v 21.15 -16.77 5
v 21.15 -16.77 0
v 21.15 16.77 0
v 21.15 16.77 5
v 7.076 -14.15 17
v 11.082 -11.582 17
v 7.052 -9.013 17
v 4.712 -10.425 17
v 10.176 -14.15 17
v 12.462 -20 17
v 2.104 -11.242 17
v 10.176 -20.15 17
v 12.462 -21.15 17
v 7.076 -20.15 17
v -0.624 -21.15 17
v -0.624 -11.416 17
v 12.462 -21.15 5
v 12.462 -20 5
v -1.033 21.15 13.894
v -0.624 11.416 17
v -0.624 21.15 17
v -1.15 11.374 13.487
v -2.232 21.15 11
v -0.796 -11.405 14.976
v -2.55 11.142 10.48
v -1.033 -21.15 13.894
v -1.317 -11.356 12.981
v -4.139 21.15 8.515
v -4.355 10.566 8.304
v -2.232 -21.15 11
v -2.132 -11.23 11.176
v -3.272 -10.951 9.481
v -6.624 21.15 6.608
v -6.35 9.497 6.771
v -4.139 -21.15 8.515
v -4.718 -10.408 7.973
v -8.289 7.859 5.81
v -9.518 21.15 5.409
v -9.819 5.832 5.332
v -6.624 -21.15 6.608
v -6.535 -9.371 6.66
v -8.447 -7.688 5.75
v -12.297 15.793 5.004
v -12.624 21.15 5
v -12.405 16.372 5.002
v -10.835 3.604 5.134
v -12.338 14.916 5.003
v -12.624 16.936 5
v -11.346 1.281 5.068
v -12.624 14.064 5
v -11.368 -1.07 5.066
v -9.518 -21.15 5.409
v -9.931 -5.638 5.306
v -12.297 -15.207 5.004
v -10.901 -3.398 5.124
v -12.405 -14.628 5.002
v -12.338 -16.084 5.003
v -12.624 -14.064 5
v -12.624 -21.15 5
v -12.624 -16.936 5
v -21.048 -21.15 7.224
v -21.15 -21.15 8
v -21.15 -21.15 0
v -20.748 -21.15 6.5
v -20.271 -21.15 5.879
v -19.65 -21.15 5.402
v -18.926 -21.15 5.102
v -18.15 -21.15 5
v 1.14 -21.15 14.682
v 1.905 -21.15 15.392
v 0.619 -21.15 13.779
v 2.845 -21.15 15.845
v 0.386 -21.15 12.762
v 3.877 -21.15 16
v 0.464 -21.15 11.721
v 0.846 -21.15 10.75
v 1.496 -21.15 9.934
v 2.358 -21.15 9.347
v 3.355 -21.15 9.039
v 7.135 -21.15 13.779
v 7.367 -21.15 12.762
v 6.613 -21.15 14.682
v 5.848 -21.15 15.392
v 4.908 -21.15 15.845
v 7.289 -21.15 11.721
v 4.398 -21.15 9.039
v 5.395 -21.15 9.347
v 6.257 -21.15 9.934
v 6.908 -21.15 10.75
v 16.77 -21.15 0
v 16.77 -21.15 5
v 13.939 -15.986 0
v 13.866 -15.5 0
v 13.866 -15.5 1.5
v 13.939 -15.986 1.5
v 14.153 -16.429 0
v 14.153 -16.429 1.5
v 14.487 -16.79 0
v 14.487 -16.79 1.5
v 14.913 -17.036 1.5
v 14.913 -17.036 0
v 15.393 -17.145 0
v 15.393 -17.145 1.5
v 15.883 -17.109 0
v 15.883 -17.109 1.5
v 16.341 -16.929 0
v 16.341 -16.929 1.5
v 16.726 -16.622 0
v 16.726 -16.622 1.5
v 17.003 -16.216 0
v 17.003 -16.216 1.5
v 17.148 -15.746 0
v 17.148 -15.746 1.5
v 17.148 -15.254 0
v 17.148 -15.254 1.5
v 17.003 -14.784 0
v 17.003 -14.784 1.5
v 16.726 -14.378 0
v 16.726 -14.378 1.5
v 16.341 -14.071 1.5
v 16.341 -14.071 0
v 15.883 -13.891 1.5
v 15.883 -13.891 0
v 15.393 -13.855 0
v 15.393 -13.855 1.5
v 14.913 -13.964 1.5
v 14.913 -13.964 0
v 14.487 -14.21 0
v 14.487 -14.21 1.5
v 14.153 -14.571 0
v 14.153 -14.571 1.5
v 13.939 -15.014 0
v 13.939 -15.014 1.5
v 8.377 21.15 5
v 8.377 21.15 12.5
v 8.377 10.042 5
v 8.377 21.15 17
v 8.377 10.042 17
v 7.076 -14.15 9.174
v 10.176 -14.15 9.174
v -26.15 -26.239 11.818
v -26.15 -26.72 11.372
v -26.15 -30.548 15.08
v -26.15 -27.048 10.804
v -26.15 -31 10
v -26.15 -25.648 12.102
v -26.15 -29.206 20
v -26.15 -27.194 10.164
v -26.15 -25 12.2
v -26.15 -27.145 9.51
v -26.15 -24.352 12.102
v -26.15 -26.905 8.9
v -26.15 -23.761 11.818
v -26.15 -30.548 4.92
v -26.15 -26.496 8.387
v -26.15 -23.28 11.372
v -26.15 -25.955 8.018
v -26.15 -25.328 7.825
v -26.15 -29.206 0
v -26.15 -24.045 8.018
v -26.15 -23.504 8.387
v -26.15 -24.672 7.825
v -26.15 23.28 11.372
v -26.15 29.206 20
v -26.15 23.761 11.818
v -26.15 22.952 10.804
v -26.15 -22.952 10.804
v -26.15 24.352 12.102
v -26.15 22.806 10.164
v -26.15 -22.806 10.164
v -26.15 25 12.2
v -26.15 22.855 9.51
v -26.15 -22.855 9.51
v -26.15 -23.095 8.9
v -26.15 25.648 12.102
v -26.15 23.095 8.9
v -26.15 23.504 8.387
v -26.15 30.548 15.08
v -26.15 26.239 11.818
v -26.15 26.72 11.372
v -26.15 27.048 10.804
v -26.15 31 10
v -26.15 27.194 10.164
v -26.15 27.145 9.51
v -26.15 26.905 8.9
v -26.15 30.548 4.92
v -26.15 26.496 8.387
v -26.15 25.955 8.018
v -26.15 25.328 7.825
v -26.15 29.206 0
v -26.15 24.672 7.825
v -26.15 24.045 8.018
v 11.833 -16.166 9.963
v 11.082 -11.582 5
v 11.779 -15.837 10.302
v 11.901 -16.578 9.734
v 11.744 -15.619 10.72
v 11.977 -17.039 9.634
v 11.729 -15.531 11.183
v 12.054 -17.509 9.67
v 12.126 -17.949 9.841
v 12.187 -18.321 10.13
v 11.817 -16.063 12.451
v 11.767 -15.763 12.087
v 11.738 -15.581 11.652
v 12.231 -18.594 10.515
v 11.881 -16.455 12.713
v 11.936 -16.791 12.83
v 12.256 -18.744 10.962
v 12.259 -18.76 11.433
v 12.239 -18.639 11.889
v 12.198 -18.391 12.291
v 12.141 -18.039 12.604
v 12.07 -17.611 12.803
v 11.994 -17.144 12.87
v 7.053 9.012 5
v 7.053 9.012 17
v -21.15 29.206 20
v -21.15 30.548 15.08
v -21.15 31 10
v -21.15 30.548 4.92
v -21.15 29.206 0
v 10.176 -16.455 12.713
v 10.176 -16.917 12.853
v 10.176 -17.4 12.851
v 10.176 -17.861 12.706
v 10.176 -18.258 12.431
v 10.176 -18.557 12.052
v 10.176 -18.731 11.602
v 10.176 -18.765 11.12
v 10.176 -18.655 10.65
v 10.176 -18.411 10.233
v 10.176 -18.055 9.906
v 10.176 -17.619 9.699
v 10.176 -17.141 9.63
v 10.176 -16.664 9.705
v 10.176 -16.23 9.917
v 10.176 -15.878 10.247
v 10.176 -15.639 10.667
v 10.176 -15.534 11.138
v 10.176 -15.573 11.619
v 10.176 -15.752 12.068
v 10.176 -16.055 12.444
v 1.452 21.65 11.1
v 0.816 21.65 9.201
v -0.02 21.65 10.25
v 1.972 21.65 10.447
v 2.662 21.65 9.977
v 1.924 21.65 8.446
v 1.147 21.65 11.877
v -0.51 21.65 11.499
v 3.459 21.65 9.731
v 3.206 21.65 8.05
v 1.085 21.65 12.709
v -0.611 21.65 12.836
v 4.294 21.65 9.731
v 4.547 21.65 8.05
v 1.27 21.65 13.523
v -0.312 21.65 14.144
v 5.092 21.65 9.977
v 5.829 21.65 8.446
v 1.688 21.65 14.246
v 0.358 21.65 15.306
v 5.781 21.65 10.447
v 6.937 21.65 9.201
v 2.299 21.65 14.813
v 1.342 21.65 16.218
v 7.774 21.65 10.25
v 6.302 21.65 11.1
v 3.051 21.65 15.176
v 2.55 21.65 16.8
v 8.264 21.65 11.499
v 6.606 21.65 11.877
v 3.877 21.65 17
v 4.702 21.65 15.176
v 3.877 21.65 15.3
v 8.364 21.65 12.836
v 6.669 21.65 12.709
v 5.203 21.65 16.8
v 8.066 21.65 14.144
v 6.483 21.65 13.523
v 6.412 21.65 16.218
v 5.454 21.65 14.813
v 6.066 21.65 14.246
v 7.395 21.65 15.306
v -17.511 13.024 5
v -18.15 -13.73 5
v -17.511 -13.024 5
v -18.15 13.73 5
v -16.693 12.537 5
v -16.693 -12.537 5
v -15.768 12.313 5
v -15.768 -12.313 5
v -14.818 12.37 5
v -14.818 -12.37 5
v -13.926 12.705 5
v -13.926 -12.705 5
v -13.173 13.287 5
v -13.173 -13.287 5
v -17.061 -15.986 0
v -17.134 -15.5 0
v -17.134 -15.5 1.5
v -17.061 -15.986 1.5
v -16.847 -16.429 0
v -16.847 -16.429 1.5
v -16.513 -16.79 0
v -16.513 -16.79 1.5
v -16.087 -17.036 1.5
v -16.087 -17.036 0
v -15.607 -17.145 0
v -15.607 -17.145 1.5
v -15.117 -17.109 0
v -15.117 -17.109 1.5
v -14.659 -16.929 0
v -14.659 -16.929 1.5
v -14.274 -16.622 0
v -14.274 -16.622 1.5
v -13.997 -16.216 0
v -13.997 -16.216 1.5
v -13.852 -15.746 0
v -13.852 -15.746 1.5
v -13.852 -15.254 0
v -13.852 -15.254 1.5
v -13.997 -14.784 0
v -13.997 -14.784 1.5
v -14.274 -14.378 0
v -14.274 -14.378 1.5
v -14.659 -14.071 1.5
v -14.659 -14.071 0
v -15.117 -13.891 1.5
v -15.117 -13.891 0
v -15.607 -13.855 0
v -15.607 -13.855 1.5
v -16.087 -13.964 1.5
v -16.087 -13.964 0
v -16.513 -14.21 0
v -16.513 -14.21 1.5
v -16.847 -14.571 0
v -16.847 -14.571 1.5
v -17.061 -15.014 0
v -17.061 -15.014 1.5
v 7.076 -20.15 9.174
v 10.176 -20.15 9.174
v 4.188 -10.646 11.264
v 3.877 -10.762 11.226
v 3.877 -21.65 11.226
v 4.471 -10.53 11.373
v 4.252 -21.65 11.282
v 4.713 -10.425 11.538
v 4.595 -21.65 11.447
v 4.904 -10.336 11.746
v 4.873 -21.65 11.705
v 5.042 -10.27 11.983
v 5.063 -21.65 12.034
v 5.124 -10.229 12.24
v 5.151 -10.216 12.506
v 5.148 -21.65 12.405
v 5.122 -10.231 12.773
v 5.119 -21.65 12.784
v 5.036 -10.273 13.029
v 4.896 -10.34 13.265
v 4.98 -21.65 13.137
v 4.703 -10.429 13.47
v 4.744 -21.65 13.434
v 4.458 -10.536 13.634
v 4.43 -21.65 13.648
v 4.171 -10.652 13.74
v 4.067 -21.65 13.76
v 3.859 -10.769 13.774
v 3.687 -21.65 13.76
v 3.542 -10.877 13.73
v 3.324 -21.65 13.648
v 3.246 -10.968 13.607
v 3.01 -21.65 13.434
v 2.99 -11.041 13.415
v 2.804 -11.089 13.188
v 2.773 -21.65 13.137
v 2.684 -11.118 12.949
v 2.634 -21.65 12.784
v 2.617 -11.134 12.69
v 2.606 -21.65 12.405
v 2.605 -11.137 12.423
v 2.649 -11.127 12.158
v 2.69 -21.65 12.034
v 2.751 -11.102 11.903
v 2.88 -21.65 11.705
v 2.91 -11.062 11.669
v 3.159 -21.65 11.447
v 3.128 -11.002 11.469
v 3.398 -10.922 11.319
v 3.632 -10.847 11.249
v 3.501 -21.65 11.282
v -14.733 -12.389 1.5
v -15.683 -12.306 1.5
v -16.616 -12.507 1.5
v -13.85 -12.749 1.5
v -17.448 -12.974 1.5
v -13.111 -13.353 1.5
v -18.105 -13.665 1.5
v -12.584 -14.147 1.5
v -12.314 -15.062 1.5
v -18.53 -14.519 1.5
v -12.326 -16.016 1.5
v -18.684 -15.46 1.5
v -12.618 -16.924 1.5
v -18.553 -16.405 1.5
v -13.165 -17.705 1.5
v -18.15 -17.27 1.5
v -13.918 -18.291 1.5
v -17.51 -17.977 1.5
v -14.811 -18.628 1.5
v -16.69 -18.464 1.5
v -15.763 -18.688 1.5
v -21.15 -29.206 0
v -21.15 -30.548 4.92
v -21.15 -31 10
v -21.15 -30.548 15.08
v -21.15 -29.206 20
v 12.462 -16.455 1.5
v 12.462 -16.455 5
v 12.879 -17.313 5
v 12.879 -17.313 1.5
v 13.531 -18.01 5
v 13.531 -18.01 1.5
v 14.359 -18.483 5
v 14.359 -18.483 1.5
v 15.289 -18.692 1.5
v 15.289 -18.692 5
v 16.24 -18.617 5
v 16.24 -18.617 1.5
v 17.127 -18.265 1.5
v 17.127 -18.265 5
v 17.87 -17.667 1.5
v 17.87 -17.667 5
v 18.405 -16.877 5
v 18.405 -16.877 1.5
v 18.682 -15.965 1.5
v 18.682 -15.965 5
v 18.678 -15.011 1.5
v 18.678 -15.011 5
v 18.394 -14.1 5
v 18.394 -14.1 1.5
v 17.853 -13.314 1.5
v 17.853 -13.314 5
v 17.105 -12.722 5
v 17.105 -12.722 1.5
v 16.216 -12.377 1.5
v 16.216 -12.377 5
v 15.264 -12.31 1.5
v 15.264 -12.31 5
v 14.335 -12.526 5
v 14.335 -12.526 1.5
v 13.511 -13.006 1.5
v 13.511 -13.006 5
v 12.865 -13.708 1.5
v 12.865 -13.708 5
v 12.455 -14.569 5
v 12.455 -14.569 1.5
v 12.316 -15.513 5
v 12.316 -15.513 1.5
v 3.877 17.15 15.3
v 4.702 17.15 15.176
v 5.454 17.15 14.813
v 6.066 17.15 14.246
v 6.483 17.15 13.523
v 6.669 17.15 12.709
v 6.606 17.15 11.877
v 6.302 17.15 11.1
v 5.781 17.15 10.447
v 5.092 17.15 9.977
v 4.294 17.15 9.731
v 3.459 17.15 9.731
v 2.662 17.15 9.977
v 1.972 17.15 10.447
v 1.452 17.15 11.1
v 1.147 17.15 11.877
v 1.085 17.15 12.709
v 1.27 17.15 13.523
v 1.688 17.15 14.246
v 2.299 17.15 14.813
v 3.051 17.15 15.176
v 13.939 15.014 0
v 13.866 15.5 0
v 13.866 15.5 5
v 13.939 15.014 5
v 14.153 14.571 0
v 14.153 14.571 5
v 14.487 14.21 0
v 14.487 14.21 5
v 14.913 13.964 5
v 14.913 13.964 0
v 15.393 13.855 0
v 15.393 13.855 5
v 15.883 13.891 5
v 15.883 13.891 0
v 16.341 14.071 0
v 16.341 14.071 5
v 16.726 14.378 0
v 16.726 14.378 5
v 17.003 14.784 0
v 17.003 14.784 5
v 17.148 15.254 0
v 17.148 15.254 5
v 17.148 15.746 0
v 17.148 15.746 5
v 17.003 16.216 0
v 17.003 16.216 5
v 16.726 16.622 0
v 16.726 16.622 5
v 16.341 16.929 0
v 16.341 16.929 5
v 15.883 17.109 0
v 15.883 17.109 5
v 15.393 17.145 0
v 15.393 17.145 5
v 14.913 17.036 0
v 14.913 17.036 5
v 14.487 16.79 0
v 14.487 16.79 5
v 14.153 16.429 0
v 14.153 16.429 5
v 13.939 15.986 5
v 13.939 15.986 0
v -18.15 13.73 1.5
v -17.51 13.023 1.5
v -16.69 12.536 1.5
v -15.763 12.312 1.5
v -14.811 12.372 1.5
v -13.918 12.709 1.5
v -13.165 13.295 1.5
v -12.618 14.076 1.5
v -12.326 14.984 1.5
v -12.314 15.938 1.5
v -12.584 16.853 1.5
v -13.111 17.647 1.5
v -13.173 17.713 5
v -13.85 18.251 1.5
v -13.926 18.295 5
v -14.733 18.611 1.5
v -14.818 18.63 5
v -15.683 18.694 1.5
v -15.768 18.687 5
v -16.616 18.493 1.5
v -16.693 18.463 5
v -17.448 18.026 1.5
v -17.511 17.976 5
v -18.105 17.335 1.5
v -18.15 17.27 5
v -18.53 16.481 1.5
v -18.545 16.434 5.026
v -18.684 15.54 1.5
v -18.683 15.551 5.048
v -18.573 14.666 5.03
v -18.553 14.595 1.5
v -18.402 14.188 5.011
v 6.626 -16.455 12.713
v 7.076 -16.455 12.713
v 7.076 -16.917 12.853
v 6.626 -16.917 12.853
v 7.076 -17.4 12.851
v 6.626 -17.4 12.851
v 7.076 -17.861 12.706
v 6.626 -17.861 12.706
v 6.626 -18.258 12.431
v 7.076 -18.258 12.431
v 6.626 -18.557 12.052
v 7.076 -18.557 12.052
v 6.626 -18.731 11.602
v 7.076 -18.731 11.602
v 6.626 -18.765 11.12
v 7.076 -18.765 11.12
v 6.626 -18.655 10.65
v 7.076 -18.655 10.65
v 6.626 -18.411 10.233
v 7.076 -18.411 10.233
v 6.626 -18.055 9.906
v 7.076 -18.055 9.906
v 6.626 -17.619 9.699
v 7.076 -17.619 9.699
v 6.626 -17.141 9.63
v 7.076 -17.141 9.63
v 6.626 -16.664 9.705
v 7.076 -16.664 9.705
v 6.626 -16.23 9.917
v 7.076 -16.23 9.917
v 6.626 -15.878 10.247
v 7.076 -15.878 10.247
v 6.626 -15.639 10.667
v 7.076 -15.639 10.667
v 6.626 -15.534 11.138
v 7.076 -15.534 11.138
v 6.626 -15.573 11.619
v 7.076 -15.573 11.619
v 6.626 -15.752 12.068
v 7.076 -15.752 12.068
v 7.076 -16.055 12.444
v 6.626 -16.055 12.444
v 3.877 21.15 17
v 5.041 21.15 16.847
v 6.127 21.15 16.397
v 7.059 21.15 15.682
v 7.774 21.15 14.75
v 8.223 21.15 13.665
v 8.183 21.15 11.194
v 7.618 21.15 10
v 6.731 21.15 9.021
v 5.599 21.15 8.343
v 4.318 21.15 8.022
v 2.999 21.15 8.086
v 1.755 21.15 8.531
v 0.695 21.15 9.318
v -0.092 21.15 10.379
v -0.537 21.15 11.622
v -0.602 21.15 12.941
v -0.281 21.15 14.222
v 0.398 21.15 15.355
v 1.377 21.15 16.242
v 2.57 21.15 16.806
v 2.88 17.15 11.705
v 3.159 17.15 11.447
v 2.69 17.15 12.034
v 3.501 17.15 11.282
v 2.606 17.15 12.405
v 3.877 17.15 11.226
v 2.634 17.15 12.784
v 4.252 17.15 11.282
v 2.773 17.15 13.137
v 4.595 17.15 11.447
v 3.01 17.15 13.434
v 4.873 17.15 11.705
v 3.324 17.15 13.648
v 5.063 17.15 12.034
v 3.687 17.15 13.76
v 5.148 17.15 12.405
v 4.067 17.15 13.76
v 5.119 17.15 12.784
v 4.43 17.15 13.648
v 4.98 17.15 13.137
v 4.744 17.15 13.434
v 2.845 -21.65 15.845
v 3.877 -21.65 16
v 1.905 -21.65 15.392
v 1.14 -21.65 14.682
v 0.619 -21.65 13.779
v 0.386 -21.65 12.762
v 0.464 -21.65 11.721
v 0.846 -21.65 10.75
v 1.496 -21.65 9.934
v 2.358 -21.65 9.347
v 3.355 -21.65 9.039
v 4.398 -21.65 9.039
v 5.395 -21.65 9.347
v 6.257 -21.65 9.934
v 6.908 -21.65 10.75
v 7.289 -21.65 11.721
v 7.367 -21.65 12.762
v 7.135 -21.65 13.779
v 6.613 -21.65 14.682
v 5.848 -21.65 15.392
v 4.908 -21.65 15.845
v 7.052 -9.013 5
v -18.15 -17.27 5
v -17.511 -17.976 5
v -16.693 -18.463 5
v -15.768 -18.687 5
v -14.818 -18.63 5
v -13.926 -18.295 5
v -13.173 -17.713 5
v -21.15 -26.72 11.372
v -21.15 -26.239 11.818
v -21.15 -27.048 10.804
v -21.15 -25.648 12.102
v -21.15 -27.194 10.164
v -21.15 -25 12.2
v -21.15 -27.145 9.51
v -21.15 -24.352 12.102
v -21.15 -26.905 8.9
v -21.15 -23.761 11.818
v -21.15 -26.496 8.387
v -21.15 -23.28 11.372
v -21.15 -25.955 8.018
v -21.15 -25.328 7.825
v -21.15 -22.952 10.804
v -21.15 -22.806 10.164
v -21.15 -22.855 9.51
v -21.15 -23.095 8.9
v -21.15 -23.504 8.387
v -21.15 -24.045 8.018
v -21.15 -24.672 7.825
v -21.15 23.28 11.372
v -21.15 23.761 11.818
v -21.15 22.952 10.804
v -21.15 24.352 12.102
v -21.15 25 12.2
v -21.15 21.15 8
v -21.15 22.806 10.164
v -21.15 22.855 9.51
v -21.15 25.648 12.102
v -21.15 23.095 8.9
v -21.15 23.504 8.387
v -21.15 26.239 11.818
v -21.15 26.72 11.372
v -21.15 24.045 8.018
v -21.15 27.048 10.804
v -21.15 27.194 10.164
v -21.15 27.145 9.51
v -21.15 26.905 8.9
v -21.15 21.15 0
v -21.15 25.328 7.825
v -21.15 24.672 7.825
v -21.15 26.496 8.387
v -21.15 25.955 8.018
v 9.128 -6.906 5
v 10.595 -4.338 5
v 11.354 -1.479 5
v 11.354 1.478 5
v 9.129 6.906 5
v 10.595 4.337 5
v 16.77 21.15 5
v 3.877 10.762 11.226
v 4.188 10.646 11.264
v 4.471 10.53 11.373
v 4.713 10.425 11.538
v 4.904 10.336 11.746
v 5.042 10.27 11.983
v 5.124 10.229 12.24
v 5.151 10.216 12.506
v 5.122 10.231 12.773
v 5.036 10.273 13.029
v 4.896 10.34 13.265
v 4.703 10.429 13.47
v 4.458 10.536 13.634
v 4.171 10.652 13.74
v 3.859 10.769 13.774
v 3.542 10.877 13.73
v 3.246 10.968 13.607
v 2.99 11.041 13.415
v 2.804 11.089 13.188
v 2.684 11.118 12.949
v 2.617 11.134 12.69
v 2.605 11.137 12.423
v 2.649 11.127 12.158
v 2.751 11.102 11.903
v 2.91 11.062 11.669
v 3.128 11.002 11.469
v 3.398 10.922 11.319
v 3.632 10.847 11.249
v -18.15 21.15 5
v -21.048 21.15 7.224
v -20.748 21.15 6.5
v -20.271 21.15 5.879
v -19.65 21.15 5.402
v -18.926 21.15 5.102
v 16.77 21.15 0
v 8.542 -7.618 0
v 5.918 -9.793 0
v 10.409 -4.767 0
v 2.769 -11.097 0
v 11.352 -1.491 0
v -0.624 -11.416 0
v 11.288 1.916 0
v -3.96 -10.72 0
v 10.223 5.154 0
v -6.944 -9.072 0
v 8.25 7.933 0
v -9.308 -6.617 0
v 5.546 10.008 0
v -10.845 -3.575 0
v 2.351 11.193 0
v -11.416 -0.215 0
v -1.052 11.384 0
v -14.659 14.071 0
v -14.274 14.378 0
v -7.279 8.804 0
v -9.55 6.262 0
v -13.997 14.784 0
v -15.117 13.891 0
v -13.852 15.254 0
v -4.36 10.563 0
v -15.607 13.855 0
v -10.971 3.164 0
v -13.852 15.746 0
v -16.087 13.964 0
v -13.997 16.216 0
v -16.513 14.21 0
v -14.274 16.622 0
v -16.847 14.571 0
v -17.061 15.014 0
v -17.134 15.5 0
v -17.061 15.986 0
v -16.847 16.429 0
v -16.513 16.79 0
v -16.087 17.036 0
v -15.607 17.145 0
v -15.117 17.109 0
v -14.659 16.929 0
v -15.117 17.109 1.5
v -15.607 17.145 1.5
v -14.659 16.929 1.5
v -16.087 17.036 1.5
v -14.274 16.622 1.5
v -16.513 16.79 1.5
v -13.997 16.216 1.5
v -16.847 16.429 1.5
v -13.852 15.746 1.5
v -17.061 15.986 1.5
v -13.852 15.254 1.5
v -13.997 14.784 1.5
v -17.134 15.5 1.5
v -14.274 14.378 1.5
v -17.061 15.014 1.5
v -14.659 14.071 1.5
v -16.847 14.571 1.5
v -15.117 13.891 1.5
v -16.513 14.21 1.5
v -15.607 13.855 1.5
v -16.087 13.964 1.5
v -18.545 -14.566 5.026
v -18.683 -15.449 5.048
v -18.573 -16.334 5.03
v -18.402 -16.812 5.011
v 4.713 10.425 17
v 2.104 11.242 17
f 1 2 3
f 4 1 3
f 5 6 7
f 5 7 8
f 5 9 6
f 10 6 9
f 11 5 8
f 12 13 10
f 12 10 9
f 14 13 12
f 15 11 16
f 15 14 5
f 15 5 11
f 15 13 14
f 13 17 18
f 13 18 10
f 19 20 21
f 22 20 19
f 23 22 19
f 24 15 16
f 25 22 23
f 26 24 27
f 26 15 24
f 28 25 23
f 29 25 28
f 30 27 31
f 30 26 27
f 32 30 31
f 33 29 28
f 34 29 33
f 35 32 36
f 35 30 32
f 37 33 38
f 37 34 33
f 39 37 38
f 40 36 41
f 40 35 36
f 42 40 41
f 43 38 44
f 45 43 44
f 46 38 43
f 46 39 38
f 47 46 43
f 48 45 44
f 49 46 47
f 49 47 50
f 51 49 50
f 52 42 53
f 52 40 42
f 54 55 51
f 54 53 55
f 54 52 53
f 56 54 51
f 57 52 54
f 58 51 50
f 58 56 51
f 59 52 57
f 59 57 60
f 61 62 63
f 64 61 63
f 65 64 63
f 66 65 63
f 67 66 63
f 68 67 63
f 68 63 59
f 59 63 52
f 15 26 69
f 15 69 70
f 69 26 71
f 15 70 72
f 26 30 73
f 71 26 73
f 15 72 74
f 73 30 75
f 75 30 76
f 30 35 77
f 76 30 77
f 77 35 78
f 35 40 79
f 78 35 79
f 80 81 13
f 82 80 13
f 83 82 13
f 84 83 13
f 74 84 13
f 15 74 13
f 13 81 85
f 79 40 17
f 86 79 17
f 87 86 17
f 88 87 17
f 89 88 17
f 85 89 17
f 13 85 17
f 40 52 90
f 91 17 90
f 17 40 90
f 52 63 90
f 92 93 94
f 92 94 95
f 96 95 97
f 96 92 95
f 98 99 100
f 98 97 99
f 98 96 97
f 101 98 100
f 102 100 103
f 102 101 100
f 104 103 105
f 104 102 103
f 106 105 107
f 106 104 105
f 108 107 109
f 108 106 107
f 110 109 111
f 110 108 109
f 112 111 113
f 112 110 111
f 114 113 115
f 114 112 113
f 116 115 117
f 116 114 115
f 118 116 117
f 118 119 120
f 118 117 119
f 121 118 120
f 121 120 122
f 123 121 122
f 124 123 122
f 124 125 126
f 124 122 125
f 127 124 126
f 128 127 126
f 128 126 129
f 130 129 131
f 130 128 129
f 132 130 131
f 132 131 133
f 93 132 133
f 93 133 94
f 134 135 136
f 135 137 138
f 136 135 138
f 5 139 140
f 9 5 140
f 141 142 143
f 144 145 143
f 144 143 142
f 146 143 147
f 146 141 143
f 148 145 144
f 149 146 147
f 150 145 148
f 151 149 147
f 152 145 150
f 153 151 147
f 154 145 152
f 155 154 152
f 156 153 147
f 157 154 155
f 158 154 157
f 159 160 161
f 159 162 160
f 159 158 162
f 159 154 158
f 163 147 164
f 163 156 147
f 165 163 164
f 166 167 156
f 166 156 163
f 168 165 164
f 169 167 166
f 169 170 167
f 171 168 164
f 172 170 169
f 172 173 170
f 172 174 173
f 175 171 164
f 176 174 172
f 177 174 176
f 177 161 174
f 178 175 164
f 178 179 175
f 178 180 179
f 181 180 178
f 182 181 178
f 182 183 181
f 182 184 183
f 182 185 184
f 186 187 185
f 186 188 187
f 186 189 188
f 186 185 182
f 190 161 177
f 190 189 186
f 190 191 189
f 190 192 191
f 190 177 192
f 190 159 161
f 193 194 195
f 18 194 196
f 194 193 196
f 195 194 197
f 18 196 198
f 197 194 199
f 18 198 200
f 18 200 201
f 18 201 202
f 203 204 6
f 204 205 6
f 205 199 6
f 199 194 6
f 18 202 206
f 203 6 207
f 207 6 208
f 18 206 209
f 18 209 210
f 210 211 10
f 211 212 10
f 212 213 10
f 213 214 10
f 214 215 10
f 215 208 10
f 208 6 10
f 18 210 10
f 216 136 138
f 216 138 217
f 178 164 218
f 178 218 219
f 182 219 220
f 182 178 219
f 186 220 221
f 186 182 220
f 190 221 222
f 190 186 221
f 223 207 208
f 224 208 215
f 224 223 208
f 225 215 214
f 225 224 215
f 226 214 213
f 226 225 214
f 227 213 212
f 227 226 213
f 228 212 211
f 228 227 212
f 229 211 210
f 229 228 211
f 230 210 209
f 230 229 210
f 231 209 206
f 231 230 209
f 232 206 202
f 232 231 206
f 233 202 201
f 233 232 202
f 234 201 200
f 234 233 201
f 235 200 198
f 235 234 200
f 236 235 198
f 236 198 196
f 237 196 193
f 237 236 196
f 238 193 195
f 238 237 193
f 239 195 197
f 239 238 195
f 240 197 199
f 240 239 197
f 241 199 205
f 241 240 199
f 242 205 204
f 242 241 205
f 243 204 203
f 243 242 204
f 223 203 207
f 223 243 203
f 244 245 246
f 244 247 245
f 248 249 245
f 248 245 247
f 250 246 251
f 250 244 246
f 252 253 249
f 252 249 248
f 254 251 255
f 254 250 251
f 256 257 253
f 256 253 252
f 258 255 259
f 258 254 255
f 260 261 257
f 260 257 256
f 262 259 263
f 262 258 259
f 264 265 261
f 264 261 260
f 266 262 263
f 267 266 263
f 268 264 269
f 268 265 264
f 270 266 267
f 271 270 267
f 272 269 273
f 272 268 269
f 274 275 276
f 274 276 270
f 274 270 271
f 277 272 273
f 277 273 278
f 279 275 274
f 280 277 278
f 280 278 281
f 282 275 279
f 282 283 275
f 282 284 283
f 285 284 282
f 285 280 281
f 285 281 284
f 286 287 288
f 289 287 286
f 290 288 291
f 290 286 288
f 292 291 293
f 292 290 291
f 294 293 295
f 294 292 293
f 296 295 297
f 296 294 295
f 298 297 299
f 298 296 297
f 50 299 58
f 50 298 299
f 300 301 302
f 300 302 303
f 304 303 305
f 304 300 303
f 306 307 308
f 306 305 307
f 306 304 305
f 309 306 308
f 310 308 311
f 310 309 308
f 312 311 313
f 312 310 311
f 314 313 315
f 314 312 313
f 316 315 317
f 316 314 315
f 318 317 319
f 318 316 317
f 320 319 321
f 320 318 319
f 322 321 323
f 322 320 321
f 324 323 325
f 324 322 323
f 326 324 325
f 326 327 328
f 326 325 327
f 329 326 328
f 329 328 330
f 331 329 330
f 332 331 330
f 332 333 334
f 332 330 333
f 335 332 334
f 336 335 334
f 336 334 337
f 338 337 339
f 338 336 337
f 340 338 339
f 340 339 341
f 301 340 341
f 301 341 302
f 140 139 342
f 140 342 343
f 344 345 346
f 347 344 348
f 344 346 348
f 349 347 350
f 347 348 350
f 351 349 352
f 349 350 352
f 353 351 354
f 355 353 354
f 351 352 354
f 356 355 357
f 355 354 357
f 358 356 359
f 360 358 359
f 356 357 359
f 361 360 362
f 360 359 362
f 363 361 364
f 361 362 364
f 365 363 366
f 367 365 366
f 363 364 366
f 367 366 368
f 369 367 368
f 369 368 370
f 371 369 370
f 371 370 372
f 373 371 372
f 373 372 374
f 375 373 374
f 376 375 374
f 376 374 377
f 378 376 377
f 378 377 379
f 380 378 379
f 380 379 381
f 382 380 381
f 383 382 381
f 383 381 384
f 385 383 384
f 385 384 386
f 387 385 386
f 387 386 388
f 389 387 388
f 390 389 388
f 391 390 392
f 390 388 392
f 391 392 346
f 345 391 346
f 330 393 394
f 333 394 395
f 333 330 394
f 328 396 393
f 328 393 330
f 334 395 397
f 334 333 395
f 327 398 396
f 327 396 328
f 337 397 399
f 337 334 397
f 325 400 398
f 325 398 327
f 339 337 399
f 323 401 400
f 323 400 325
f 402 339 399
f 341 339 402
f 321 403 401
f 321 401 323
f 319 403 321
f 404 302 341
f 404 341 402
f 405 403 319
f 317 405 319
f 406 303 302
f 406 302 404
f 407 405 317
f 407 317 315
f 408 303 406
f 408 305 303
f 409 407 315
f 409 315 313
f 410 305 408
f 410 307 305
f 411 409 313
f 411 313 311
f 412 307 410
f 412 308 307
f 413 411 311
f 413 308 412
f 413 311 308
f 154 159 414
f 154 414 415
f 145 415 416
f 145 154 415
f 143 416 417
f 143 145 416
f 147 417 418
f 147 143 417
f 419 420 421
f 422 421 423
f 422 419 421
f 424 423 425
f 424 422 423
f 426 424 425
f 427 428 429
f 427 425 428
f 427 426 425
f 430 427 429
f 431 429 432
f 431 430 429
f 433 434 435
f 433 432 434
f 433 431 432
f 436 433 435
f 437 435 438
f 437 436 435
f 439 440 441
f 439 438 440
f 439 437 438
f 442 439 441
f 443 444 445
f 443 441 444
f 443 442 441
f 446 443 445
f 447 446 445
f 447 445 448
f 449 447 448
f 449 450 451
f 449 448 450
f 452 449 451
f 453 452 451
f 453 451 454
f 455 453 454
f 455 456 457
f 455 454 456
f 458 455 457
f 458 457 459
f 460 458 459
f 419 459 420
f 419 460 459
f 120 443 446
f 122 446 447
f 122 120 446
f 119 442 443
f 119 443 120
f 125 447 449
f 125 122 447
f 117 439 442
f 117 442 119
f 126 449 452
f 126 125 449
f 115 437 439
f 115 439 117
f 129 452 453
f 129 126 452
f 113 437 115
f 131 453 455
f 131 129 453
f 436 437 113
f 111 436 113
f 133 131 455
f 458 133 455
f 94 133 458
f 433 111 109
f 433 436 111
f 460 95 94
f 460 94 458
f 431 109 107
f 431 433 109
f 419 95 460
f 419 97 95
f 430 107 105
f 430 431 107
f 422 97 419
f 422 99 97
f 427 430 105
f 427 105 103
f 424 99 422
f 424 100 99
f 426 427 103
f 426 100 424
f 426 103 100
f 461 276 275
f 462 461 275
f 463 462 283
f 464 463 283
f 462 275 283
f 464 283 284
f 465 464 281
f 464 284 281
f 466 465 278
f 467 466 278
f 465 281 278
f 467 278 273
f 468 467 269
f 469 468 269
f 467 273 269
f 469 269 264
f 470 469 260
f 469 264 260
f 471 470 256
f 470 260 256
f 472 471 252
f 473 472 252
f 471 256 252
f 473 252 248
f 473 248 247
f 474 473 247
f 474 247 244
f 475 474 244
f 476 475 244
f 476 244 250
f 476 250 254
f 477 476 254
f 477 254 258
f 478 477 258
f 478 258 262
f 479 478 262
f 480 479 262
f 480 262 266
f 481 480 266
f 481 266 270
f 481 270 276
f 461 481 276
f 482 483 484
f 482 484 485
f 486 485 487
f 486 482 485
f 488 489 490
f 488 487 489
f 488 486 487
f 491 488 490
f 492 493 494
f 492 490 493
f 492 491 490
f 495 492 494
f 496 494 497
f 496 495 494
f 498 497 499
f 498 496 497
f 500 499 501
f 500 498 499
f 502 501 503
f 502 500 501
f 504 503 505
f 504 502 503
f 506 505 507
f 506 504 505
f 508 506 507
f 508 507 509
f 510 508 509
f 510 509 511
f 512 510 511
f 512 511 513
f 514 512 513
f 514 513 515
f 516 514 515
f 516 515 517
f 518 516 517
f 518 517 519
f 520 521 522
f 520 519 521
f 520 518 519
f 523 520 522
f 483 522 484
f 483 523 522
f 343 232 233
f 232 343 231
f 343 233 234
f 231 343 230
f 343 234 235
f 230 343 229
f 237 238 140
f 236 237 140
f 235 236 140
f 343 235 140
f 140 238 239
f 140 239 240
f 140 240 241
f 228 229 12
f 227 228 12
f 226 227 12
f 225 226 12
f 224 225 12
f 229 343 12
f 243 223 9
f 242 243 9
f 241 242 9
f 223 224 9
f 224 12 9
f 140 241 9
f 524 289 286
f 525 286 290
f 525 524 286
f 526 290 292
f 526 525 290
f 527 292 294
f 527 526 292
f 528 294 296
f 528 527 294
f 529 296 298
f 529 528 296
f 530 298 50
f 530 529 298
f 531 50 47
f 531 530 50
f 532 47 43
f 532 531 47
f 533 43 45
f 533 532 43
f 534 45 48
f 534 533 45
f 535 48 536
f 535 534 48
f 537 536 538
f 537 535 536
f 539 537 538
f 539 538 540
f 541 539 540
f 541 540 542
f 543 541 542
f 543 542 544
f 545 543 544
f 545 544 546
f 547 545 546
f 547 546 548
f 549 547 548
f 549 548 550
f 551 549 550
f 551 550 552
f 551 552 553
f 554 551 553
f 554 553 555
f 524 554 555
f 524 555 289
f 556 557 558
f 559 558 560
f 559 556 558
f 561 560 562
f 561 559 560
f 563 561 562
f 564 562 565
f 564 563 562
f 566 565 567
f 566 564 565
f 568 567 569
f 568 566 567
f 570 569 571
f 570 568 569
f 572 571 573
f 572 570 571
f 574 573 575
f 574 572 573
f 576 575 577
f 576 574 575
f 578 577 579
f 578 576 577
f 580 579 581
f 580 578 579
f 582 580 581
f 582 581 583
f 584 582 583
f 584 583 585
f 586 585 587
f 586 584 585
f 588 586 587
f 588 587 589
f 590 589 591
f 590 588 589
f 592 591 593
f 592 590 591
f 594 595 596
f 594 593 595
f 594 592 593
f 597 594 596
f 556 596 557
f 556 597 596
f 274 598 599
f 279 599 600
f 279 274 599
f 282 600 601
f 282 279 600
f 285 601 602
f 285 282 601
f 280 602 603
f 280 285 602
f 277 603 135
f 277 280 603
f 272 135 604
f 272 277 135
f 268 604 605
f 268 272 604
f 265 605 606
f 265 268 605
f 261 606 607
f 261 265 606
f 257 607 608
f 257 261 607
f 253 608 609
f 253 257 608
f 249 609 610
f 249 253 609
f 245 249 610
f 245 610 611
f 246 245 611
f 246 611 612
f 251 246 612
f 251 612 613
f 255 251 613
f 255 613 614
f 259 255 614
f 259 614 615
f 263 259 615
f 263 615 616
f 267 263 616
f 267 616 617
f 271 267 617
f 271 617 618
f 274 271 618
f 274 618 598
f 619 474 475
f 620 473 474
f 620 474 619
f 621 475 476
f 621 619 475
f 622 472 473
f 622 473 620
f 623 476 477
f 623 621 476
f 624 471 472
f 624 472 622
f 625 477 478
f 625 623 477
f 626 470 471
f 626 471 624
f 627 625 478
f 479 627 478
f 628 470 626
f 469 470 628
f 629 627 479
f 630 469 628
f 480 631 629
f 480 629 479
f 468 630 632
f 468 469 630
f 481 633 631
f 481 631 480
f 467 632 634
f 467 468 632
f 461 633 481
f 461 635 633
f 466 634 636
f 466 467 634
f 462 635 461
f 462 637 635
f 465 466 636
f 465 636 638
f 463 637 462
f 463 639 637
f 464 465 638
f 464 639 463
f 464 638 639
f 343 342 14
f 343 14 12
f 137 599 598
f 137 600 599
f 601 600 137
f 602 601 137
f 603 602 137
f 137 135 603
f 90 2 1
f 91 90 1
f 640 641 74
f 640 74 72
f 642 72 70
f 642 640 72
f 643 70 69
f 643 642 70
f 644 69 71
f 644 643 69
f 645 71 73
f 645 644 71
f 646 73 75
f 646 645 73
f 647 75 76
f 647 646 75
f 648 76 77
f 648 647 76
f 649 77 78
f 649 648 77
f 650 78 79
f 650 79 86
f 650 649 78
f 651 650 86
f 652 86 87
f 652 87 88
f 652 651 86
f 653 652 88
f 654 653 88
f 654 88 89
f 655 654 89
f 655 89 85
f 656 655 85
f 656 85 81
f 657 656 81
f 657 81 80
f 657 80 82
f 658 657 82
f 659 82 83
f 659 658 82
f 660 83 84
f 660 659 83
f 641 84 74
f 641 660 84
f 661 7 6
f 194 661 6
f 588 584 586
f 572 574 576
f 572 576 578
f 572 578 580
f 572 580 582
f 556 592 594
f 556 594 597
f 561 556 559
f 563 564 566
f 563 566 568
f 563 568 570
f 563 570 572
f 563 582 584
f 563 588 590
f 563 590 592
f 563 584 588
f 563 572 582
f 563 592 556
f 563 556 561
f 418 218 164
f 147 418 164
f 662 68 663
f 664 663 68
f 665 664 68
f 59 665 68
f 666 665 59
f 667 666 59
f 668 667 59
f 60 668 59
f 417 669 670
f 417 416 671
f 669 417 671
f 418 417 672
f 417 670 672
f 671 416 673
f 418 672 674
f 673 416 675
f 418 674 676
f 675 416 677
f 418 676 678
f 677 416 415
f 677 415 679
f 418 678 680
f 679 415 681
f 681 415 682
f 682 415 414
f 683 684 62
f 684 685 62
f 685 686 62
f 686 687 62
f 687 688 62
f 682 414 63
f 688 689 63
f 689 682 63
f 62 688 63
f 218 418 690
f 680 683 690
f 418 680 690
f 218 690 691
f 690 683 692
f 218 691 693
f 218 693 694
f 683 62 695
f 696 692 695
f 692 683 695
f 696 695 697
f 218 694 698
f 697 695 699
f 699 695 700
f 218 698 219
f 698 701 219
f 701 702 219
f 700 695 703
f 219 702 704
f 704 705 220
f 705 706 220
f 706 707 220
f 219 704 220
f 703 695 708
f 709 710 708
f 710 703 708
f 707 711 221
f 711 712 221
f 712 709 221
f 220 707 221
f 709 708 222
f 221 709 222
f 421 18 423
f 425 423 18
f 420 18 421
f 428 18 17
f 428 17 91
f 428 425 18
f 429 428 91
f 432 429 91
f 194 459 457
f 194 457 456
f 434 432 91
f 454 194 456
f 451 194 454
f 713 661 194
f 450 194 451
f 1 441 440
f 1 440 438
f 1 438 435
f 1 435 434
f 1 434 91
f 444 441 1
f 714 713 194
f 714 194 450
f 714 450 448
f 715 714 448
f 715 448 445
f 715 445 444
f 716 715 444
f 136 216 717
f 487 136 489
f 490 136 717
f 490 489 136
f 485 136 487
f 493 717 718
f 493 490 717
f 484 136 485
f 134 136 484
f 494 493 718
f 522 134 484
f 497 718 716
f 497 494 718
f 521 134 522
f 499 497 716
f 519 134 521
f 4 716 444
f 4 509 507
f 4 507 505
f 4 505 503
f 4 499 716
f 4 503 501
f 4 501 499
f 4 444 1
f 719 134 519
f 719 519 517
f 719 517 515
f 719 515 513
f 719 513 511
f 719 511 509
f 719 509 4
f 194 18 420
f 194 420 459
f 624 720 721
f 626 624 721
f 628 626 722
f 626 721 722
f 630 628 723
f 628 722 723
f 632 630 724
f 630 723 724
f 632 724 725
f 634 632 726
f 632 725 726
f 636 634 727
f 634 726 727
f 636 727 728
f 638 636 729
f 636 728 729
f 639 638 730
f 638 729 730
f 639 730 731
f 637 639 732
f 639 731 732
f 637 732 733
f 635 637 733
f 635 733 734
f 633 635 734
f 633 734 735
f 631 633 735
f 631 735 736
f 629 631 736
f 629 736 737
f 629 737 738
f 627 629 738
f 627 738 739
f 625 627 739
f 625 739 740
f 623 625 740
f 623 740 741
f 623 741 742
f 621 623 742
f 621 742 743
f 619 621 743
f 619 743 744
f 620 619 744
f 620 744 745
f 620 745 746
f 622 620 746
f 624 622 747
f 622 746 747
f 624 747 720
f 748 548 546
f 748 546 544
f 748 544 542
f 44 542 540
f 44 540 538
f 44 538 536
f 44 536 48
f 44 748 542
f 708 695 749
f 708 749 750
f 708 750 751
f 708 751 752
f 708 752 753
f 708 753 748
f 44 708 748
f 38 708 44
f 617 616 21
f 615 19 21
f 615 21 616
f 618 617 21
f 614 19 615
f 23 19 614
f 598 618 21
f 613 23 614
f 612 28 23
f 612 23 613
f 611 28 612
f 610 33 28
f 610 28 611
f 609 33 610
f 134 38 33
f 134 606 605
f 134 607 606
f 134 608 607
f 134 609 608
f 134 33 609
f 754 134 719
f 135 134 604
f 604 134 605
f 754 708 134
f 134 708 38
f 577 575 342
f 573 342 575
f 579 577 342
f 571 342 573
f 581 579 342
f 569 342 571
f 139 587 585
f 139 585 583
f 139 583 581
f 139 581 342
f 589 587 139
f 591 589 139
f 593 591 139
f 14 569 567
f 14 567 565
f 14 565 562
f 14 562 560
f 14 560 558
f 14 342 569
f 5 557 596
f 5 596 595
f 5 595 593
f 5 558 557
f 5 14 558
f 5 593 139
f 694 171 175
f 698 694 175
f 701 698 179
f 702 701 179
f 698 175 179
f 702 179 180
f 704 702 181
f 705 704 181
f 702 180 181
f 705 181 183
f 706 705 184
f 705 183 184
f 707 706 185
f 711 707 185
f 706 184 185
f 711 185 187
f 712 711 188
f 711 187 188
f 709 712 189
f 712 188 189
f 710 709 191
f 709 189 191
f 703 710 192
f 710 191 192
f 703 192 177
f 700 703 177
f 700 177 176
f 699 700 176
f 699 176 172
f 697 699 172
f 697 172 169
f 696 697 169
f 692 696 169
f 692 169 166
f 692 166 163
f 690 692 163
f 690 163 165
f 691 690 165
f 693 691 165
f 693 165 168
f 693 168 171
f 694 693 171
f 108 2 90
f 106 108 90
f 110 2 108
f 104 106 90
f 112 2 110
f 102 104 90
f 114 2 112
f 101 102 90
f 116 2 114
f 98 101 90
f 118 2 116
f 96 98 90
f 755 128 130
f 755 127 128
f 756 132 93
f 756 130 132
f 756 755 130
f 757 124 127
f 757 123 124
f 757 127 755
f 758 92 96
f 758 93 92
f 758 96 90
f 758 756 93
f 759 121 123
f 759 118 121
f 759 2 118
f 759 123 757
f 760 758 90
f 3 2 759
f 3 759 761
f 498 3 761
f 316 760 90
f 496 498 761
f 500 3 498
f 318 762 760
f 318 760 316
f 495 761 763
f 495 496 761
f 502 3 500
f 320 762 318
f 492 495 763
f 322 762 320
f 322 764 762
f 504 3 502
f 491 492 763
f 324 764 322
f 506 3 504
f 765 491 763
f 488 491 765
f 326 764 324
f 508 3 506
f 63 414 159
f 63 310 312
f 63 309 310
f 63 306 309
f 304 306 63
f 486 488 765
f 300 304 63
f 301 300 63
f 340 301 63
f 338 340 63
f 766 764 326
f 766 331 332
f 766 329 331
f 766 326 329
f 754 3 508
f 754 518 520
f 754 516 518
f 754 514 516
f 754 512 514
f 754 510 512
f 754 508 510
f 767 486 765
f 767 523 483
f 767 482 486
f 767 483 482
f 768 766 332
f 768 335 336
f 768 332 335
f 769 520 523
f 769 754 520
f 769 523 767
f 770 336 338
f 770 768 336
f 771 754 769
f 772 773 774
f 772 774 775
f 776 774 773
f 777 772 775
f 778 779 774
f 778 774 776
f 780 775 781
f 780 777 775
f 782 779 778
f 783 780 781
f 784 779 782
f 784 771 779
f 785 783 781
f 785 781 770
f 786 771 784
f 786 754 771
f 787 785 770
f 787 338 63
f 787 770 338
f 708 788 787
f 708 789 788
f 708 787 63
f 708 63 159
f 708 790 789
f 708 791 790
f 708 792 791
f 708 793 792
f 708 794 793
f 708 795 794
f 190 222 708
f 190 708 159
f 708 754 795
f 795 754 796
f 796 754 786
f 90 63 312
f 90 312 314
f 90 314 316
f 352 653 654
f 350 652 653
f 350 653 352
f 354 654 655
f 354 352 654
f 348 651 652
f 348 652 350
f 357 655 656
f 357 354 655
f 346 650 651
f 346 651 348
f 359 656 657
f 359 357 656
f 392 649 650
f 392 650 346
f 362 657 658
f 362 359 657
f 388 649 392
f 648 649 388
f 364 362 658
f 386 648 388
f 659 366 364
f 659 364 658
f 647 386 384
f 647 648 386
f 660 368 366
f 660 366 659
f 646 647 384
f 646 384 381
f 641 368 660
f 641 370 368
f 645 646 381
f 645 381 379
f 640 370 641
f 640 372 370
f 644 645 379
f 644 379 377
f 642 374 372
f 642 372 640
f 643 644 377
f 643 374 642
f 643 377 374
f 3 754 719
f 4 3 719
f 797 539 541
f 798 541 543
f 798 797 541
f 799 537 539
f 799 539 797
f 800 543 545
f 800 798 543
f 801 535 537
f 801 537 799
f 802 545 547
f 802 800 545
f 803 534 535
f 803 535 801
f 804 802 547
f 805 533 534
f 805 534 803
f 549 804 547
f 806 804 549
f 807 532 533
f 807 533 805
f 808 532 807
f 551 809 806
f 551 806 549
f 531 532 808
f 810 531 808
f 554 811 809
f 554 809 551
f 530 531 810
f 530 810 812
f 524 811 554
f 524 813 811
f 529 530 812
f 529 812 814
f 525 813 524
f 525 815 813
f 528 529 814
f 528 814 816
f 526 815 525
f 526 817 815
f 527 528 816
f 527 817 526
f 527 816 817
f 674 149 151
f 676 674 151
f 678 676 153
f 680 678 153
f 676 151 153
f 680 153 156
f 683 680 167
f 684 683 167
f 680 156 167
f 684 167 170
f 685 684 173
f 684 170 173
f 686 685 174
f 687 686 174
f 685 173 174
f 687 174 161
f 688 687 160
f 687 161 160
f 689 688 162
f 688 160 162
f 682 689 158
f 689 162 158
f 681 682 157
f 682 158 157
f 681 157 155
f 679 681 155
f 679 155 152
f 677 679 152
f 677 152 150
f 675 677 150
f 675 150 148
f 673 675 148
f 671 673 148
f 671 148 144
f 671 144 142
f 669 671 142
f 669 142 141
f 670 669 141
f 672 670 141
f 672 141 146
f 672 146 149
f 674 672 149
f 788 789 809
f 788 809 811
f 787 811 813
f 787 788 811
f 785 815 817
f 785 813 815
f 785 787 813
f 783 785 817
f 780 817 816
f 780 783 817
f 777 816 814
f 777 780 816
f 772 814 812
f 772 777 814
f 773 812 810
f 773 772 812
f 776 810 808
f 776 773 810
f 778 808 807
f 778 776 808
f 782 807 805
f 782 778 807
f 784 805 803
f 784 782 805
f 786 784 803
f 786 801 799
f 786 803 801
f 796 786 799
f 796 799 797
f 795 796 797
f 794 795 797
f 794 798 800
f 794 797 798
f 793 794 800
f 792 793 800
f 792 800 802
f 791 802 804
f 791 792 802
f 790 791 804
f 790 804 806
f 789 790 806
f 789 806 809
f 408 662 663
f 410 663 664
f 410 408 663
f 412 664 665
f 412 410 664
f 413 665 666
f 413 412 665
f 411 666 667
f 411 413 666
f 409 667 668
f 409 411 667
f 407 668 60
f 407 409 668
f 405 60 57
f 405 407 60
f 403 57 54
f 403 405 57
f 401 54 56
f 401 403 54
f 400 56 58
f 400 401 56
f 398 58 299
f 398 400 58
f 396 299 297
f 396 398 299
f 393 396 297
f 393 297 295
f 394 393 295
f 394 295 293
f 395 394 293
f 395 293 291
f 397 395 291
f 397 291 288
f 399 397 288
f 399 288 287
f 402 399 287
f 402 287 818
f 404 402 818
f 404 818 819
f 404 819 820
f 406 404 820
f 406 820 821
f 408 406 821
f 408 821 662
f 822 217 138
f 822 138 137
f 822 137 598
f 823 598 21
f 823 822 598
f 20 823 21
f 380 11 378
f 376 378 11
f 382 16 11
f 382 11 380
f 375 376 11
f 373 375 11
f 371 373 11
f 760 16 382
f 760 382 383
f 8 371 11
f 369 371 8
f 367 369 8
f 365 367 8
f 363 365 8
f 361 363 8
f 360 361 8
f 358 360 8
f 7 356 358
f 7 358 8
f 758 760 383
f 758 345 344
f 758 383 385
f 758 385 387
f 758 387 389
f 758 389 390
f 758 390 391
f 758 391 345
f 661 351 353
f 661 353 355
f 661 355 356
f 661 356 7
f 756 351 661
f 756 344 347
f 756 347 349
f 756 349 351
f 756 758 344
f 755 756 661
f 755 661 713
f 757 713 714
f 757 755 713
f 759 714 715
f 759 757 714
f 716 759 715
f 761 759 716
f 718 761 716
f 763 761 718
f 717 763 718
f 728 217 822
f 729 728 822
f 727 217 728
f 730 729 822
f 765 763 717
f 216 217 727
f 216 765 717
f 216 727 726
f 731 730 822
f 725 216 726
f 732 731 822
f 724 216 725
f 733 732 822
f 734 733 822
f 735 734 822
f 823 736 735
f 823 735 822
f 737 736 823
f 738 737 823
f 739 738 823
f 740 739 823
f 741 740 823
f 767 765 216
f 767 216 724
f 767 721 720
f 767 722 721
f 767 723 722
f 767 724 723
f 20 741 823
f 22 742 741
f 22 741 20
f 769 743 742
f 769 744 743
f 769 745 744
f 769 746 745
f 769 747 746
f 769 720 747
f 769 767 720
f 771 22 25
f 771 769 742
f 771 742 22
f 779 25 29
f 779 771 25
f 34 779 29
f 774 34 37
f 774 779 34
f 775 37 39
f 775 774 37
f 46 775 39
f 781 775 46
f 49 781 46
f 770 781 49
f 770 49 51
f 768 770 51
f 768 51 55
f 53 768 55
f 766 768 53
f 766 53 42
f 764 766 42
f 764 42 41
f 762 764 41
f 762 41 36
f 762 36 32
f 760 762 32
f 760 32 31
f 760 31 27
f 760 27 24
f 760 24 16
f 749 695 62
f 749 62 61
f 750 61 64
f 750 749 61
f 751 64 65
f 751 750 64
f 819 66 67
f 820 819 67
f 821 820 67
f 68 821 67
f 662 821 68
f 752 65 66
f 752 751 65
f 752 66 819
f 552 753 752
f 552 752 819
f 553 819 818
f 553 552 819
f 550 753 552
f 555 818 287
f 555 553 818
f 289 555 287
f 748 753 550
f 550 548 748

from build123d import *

# Parameters (mm, degrees)
SKETCH1_W               = 42.3
SKETCH1_H               = 42.3
BOSS_EXTRUDE1_DEPTH     = 5
CHAMFER1_SIZE           = 4.38
SKETCH4_W               = 5
SKETCH4_H               = 62
BOSS_EXTRUDE2_DEPTH     = 20
SKETCH5_R               = 2.2
CUT_EXTRUDE3_DEPTH      = 60.985748307
BOSS_EXTRUDE3_DEPTH     = 42.3
FILLET1_R               = 3
CUT_EXTRUDE1_DEPTH      = 44.24144424
CUT_EXTRUDE1_DEPTH_BACK = 44.24144424
SKETCH2_R               = 11.433895
SKETCH2_R_2             = 1.65
CUT_EXTRUDE2_DEPTH      = 44.24144424
CUT_EXTRUDE2_DEPTH_BACK = 3.5
SKETCH3_R               = 3.2
SKETCH7_R               = 1.27442
CUT_EXTRUDE4_DEPTH      = 62.672076339
BOSS_EXTRUDE4_START     = 0.5
SKETCH8_R               = 3.5
SKETCH8_R_2             = 1.27442
BOSS_EXTRUDE4_DEPTH     = 0.5
SKETCH9_R               = 2.8
CUT_EXTRUDE5_DEPTH      = 4
BOSS_EXTRUDE5_START     = 0.5
SKETCH10_R              = 4.5
SKETCH10_R_2            = 2.8
BOSS_EXTRUDE5_DEPTH     = 0.5
SKETCH11_W              = 3.1
SKETCH11_H              = 6
CUT_EXTRUDE6_DEPTH      = 7.826
CUT_EXTRUDE7_DEPTH      = 50.648434779
CUT_EXTRUDE7_DEPTH_BACK = 0.45
SKETCH12_R              = 1.62
CUT_EXTRUDE8_REACH      = 45.975


with BuildPart() as part:
    # Sketch1 → Boss-Extrude1 (new body)
    with BuildSketch(Plane.XY):
        Rectangle(SKETCH1_W, SKETCH1_H)
    extrude(amount=BOSS_EXTRUDE1_DEPTH)

    # Chamfer1
    chamfer1_edges = [part.edges().sort_by_distance(p)[0] for p in [
        (21.15, -21.15, 2.5),
        (21.15, 21.15, 2.5),
    ]]
    chamfer(chamfer1_edges, length=CHAMFER1_SIZE)

    # Sketch4 → Boss-Extrude2 (add)
    with BuildSketch(Plane(origin=(0, 0, 0), x_dir=(-1, 0, 0), z_dir=(0, 0, -1))):
        with Locations((23.65, 0)):
            Rectangle(SKETCH4_W, SKETCH4_H)
    extrude(amount=-BOSS_EXTRUDE2_DEPTH)

    # Sketch5 → Cut-Extrude3 (cut, through all)
    with BuildSketch(Plane.ZY.offset(26.15)):
        with Locations((10, 25)):
            Circle(SKETCH5_R)
        with Locations((10, -25)):
            Circle(SKETCH5_R)
        with BuildLine():
            Line((0, 29.205999997), (0, 32.205999997))
            Line((0, 32.205999997), (20, 32.205999997))
            Line((20, 32.205999997), (20, 29.205999997))
            ThreePointArc((20, 29.205999997), (10, 31), (0, 29.205999997))
        make_face()
        with BuildLine():
            Line((20, -29.205999997), (20, -32.205999997))
            Line((20, -32.205999997), (0, -32.205999997))
            Line((0, -32.205999997), (0, -29.205999997))
            ThreePointArc((0, -29.205999997), (10, -31), (20, -29.205999997))
        make_face()
    extrude(amount=-CUT_EXTRUDE3_DEPTH, mode=Mode.SUBTRACT)

    # Sketch6 → Boss-Extrude3 (add)
    with BuildSketch(Plane.XZ.offset(21.15)):
        with BuildLine():
            Line((12.462, 5), (12.462, 17))
            Line((12.462, 17), (-0.624, 17))
            ThreePointArc((-0.624, 17), (-4.138718626, 8.514718626), (-12.624, 5))
            Line((-12.624, 5), (12.462, 5))
        make_face()
    extrude(amount=-BOSS_EXTRUDE3_DEPTH)

    # Fillet1
    fillet1_edges = [part.edges().sort_by_distance(p)[0] for p in [
        (-21.15, 0, 5),
    ]]
    fillet(fillet1_edges, radius=FILLET1_R)

    # Sketch2 → Cut-Extrude1 (cut, two sides: drawn at the far end of the back side and taken through both)
    with BuildSketch(Plane.XY.offset(5).offset(-CUT_EXTRUDE1_DEPTH_BACK)):
        with Locations(Location((0.01611, 0, 0), (0, 0, 266.790701126))):
            Circle(SKETCH2_R)
        with Locations(Location((-15.48389, 15.5, 0), (0, 0, 180))):
            Circle(SKETCH2_R_2)
        with Locations(Location((15.51611, 15.5, 0), (0, 0, 180))):
            Circle(SKETCH2_R_2)
        with Locations(Location((15.51611, -15.5, 0), (0, 0, 180))):
            Circle(SKETCH2_R_2)
        with Locations(Location((-15.48389, -15.5, 0), (0, 0, 180))):
            Circle(SKETCH2_R_2)
    extrude(amount=CUT_EXTRUDE1_DEPTH + CUT_EXTRUDE1_DEPTH_BACK, mode=Mode.SUBTRACT)

    # Sketch3 → Cut-Extrude2 (cut, two sides: drawn at the far end of the back side and taken through both)
    with BuildSketch(Plane.XY.offset(5).offset(-CUT_EXTRUDE2_DEPTH_BACK)):
        with Locations(Location((-15.48389, 15.5, 0), (0, 0, 213.57533661))):
            Circle(SKETCH3_R)
        with Locations(Location((-15.48389, -15.5, 0), (0, 0, 213.57533661))):
            Circle(SKETCH3_R)
        with Locations(Location((15.51611, -15.5, 0), (0, 0, 197.367581673))):
            Circle(SKETCH3_R)
    extrude(amount=CUT_EXTRUDE2_DEPTH + CUT_EXTRUDE2_DEPTH_BACK, mode=Mode.SUBTRACT)

    # Sketch7 → Cut-Extrude4 (cut, through all)
    with BuildSketch(Plane.XZ.offset(21.15)):
        with Locations(Location((3.87669, 12.5, 0), (0, 0, 270))):
            Circle(SKETCH7_R)
    extrude(amount=-CUT_EXTRUDE4_DEPTH, mode=Mode.SUBTRACT)

    # Sketch8 → Boss-Extrude4 (add)
    with BuildSketch(Plane.XZ.offset(21.15).offset(BOSS_EXTRUDE4_START)):
        with Locations(Location((3.87669, 12.5, 0), (0, 0, 90))):
            Circle(SKETCH8_R)
        with Locations(Location((3.87669, 12.5, 0), (0, 0, 270))):
            Circle(SKETCH8_R_2, mode=Mode.SUBTRACT)
    extrude(amount=-BOSS_EXTRUDE4_DEPTH)

    # Sketch9 → Cut-Extrude5 (cut)
    with BuildSketch(Plane(origin=(0, 21.15, 0), x_dir=(1, 0, 0), z_dir=(0, 1, 0))):
        with Locations(Location((3.87669, -12.5, 0), (0, 0, 270))):
            Circle(SKETCH9_R)
    extrude(amount=-CUT_EXTRUDE5_DEPTH, mode=Mode.SUBTRACT)

    # Sketch10 → Boss-Extrude5 (add)
    with BuildSketch(Plane(origin=(0, 21.15, 0), x_dir=(1, 0, 0), z_dir=(0, 1, 0)).offset(BOSS_EXTRUDE5_START)):
        with Locations(Location((3.87669, -12.5, 0), (0, 0, 270))):
            Circle(SKETCH10_R)
        with Locations(Location((3.87669, -12.5, 0), (0, 0, 270))):
            Circle(SKETCH10_R_2, mode=Mode.SUBTRACT)
    extrude(amount=-BOSS_EXTRUDE5_DEPTH)

    # Sketch11 → Cut-Extrude6 (cut)
    with BuildSketch(Plane.XY.offset(17)):
        with Locations((8.626, -17.15)):
            Rectangle(SKETCH11_W, SKETCH11_H)
    extrude(amount=-CUT_EXTRUDE6_DEPTH, mode=Mode.SUBTRACT)

    # Sketch12 → Cut-Extrude7 (cut, two sides: drawn at the far end of the back side and taken through both)
    with BuildSketch(Plane(origin=(7.076, 0, 0), x_dir=(0, 0, -1), z_dir=(1, 0, 0)).offset(-CUT_EXTRUDE7_DEPTH_BACK)):
        with Locations(Location((-11.25, -17.15, 0), (0, 0, 154.603036972))):
            Circle(SKETCH12_R)
    extrude(amount=CUT_EXTRUDE7_DEPTH + CUT_EXTRUDE7_DEPTH_BACK, mode=Mode.SUBTRACT)

    # Cut-Extrude8: up to this face of the body (flat: up to its plane)
    cut_extrude8_end = Plane(part.part.faces().sort_by_distance((16.794233337, 1.179955887, 5))[0])
    # Sketch13 → Cut-Extrude8 (cut, up to the picked face)
    with BuildSketch(Plane.XY.offset(17), mode=Mode.PRIVATE) as cut_extrude8_sk1:
        with BuildLine():
            Line((12.462, 21.15), (8.37669, 21.15))
            Line((8.37669, 21.15), (8.37669, 10.042))
            Line((8.37669, 10.042), (7.05269, 9.012241496))
            ThreePointArc((7.05269, 9.012241496), (11.450004992, -0.000437691), (7.052, -9.012780191))
            Line((7.052, -9.012780191), (11.082, -11.582))
            Line((11.082, -11.582), (12.462, -20))
            Line((12.462, -20), (12.462, 21.15))
        make_face()
    cut_extrude8_tool1 = split(extrude(cut_extrude8_sk1.sketch, amount=-CUT_EXTRUDE8_REACH, mode=Mode.PRIVATE), bisect_by=cut_extrude8_end, keep=Keep.BOTH, mode=Mode.PRIVATE)
    add(cut_extrude8_tool1.solids().sort_by(Axis((10.711689, 5.447253, 17), (0, 0, -1)))[0], mode=Mode.SUBTRACT)


solid = part.part
